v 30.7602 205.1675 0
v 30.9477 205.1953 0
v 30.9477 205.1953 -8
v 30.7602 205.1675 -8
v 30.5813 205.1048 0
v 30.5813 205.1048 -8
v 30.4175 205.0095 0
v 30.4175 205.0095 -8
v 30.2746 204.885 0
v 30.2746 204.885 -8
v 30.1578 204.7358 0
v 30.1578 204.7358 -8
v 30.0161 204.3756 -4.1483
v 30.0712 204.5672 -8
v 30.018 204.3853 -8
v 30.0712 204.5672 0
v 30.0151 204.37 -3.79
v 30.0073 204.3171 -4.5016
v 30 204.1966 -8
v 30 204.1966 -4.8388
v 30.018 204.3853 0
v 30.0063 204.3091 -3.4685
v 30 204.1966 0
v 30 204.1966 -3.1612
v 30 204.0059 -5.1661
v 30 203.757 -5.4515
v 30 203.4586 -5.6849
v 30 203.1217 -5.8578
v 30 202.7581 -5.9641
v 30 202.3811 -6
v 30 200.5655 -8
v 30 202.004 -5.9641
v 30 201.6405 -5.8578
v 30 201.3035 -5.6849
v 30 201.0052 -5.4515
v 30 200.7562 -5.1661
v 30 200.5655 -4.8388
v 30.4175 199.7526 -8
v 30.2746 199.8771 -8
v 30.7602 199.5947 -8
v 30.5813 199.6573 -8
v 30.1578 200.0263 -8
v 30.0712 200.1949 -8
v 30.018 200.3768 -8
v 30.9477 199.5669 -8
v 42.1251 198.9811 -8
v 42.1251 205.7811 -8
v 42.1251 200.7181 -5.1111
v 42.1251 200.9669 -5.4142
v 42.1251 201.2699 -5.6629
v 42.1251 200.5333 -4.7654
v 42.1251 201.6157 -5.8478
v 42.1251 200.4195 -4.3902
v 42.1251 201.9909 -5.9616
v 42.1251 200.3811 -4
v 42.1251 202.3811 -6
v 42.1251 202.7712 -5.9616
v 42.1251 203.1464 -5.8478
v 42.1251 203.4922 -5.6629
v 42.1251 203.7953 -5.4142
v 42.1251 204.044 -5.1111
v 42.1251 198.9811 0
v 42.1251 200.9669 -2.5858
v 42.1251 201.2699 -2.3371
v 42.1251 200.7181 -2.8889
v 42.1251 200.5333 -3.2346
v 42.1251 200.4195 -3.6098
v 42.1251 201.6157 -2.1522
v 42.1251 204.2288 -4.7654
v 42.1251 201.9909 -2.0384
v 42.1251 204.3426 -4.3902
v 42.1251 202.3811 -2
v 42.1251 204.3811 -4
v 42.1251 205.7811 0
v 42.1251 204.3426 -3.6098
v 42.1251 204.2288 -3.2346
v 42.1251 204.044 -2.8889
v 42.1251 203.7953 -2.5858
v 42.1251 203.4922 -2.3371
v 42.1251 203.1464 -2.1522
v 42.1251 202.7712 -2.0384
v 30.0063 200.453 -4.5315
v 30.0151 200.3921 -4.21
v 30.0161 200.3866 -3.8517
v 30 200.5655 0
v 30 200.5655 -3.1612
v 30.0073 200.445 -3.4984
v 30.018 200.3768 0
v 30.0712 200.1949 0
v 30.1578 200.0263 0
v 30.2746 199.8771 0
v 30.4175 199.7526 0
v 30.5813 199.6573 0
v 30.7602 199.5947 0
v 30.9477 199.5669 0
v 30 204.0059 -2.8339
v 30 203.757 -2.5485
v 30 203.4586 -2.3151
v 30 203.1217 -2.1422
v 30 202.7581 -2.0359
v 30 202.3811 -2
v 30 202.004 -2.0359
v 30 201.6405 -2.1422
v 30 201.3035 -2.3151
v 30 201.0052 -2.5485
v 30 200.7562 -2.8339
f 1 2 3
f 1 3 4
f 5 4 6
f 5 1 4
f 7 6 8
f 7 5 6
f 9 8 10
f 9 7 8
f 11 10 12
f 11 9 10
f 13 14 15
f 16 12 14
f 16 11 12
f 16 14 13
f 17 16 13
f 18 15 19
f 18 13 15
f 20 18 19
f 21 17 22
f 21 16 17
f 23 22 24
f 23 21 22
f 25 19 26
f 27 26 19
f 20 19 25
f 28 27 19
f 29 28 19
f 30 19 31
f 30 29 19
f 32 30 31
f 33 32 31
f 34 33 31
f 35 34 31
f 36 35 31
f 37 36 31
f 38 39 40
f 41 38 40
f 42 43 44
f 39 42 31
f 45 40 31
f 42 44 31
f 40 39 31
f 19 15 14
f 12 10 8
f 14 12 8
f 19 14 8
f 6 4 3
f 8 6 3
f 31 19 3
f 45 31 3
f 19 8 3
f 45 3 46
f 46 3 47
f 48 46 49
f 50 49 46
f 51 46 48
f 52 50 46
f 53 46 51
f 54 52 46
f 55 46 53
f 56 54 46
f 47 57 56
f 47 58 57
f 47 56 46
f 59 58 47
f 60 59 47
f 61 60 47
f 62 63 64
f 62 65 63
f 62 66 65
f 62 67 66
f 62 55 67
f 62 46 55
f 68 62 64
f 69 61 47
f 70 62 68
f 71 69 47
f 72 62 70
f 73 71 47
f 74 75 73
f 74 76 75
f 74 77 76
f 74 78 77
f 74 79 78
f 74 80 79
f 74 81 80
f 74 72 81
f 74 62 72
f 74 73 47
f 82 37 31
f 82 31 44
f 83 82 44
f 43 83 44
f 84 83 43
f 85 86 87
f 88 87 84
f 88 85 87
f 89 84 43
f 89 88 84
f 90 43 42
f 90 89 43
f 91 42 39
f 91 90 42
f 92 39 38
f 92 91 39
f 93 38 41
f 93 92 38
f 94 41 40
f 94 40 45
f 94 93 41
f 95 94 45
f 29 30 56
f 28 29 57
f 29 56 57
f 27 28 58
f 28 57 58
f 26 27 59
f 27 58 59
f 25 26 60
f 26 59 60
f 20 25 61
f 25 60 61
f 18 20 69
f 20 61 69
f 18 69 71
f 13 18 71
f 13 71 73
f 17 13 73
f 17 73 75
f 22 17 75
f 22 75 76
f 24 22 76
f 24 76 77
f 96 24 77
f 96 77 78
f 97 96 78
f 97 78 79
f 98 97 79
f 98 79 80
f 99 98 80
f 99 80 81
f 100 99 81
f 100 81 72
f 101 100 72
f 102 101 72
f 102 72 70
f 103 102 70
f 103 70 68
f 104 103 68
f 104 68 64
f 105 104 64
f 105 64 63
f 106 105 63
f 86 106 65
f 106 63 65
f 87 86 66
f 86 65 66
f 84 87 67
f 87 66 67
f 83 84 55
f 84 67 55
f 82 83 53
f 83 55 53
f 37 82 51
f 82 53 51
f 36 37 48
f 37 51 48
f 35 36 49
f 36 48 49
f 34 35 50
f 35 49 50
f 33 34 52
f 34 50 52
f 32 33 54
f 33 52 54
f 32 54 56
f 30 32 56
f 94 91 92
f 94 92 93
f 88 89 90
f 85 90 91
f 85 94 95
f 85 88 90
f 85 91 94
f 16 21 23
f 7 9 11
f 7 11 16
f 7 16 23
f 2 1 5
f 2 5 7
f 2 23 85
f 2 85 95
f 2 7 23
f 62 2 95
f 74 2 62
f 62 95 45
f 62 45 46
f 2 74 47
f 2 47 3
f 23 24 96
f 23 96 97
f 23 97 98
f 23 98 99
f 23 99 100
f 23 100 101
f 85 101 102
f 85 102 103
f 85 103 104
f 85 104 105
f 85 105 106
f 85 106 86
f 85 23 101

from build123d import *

# Parameters (mm, degrees)
RESSALTO_EXTRUS_O1_DEPTH = 8
ESBO_O3_R                = 2
CORTE_EXTRUS_O1_DEPTH    = 13.125139244


with BuildPart() as part:
    # Esboço2 → Ressalto-extrusão1 (new body)
    with BuildSketch(Plane.XY):
        with BuildLine():
            Line((42.125139244, 205.781065113), (30.947664044, 205.195278459))
            ThreePointArc((30.947664044, 205.195278459), (30.274625629, 204.8850035), (30, 204.196648925))
            Line((30, 204.196648925), (30, 200.565481301))
            ThreePointArc((30, 200.565481301), (30.274625629, 199.877126725), (30.947664044, 199.566851766))
            Line((30.947664044, 199.566851766), (42.125139244, 198.981065113))
            Line((42.125139244, 198.981065113), (42.125139244, 205.781065113))
        make_face()
    extrude(amount=-RESSALTO_EXTRUS_O1_DEPTH)

    # Esboço3 → Corte-extrusão1 (cut, through all)
    with BuildSketch(Plane(origin=(42.125139244, 0, 0), x_dir=(0, 0, -1), z_dir=(1, 0, 0))):
        with Locations((4, 202.381065113)):
            Circle(ESBO_O3_R)
    extrude(amount=-CORTE_EXTRUS_O1_DEPTH, mode=Mode.SUBTRACT)


solid = part.part
